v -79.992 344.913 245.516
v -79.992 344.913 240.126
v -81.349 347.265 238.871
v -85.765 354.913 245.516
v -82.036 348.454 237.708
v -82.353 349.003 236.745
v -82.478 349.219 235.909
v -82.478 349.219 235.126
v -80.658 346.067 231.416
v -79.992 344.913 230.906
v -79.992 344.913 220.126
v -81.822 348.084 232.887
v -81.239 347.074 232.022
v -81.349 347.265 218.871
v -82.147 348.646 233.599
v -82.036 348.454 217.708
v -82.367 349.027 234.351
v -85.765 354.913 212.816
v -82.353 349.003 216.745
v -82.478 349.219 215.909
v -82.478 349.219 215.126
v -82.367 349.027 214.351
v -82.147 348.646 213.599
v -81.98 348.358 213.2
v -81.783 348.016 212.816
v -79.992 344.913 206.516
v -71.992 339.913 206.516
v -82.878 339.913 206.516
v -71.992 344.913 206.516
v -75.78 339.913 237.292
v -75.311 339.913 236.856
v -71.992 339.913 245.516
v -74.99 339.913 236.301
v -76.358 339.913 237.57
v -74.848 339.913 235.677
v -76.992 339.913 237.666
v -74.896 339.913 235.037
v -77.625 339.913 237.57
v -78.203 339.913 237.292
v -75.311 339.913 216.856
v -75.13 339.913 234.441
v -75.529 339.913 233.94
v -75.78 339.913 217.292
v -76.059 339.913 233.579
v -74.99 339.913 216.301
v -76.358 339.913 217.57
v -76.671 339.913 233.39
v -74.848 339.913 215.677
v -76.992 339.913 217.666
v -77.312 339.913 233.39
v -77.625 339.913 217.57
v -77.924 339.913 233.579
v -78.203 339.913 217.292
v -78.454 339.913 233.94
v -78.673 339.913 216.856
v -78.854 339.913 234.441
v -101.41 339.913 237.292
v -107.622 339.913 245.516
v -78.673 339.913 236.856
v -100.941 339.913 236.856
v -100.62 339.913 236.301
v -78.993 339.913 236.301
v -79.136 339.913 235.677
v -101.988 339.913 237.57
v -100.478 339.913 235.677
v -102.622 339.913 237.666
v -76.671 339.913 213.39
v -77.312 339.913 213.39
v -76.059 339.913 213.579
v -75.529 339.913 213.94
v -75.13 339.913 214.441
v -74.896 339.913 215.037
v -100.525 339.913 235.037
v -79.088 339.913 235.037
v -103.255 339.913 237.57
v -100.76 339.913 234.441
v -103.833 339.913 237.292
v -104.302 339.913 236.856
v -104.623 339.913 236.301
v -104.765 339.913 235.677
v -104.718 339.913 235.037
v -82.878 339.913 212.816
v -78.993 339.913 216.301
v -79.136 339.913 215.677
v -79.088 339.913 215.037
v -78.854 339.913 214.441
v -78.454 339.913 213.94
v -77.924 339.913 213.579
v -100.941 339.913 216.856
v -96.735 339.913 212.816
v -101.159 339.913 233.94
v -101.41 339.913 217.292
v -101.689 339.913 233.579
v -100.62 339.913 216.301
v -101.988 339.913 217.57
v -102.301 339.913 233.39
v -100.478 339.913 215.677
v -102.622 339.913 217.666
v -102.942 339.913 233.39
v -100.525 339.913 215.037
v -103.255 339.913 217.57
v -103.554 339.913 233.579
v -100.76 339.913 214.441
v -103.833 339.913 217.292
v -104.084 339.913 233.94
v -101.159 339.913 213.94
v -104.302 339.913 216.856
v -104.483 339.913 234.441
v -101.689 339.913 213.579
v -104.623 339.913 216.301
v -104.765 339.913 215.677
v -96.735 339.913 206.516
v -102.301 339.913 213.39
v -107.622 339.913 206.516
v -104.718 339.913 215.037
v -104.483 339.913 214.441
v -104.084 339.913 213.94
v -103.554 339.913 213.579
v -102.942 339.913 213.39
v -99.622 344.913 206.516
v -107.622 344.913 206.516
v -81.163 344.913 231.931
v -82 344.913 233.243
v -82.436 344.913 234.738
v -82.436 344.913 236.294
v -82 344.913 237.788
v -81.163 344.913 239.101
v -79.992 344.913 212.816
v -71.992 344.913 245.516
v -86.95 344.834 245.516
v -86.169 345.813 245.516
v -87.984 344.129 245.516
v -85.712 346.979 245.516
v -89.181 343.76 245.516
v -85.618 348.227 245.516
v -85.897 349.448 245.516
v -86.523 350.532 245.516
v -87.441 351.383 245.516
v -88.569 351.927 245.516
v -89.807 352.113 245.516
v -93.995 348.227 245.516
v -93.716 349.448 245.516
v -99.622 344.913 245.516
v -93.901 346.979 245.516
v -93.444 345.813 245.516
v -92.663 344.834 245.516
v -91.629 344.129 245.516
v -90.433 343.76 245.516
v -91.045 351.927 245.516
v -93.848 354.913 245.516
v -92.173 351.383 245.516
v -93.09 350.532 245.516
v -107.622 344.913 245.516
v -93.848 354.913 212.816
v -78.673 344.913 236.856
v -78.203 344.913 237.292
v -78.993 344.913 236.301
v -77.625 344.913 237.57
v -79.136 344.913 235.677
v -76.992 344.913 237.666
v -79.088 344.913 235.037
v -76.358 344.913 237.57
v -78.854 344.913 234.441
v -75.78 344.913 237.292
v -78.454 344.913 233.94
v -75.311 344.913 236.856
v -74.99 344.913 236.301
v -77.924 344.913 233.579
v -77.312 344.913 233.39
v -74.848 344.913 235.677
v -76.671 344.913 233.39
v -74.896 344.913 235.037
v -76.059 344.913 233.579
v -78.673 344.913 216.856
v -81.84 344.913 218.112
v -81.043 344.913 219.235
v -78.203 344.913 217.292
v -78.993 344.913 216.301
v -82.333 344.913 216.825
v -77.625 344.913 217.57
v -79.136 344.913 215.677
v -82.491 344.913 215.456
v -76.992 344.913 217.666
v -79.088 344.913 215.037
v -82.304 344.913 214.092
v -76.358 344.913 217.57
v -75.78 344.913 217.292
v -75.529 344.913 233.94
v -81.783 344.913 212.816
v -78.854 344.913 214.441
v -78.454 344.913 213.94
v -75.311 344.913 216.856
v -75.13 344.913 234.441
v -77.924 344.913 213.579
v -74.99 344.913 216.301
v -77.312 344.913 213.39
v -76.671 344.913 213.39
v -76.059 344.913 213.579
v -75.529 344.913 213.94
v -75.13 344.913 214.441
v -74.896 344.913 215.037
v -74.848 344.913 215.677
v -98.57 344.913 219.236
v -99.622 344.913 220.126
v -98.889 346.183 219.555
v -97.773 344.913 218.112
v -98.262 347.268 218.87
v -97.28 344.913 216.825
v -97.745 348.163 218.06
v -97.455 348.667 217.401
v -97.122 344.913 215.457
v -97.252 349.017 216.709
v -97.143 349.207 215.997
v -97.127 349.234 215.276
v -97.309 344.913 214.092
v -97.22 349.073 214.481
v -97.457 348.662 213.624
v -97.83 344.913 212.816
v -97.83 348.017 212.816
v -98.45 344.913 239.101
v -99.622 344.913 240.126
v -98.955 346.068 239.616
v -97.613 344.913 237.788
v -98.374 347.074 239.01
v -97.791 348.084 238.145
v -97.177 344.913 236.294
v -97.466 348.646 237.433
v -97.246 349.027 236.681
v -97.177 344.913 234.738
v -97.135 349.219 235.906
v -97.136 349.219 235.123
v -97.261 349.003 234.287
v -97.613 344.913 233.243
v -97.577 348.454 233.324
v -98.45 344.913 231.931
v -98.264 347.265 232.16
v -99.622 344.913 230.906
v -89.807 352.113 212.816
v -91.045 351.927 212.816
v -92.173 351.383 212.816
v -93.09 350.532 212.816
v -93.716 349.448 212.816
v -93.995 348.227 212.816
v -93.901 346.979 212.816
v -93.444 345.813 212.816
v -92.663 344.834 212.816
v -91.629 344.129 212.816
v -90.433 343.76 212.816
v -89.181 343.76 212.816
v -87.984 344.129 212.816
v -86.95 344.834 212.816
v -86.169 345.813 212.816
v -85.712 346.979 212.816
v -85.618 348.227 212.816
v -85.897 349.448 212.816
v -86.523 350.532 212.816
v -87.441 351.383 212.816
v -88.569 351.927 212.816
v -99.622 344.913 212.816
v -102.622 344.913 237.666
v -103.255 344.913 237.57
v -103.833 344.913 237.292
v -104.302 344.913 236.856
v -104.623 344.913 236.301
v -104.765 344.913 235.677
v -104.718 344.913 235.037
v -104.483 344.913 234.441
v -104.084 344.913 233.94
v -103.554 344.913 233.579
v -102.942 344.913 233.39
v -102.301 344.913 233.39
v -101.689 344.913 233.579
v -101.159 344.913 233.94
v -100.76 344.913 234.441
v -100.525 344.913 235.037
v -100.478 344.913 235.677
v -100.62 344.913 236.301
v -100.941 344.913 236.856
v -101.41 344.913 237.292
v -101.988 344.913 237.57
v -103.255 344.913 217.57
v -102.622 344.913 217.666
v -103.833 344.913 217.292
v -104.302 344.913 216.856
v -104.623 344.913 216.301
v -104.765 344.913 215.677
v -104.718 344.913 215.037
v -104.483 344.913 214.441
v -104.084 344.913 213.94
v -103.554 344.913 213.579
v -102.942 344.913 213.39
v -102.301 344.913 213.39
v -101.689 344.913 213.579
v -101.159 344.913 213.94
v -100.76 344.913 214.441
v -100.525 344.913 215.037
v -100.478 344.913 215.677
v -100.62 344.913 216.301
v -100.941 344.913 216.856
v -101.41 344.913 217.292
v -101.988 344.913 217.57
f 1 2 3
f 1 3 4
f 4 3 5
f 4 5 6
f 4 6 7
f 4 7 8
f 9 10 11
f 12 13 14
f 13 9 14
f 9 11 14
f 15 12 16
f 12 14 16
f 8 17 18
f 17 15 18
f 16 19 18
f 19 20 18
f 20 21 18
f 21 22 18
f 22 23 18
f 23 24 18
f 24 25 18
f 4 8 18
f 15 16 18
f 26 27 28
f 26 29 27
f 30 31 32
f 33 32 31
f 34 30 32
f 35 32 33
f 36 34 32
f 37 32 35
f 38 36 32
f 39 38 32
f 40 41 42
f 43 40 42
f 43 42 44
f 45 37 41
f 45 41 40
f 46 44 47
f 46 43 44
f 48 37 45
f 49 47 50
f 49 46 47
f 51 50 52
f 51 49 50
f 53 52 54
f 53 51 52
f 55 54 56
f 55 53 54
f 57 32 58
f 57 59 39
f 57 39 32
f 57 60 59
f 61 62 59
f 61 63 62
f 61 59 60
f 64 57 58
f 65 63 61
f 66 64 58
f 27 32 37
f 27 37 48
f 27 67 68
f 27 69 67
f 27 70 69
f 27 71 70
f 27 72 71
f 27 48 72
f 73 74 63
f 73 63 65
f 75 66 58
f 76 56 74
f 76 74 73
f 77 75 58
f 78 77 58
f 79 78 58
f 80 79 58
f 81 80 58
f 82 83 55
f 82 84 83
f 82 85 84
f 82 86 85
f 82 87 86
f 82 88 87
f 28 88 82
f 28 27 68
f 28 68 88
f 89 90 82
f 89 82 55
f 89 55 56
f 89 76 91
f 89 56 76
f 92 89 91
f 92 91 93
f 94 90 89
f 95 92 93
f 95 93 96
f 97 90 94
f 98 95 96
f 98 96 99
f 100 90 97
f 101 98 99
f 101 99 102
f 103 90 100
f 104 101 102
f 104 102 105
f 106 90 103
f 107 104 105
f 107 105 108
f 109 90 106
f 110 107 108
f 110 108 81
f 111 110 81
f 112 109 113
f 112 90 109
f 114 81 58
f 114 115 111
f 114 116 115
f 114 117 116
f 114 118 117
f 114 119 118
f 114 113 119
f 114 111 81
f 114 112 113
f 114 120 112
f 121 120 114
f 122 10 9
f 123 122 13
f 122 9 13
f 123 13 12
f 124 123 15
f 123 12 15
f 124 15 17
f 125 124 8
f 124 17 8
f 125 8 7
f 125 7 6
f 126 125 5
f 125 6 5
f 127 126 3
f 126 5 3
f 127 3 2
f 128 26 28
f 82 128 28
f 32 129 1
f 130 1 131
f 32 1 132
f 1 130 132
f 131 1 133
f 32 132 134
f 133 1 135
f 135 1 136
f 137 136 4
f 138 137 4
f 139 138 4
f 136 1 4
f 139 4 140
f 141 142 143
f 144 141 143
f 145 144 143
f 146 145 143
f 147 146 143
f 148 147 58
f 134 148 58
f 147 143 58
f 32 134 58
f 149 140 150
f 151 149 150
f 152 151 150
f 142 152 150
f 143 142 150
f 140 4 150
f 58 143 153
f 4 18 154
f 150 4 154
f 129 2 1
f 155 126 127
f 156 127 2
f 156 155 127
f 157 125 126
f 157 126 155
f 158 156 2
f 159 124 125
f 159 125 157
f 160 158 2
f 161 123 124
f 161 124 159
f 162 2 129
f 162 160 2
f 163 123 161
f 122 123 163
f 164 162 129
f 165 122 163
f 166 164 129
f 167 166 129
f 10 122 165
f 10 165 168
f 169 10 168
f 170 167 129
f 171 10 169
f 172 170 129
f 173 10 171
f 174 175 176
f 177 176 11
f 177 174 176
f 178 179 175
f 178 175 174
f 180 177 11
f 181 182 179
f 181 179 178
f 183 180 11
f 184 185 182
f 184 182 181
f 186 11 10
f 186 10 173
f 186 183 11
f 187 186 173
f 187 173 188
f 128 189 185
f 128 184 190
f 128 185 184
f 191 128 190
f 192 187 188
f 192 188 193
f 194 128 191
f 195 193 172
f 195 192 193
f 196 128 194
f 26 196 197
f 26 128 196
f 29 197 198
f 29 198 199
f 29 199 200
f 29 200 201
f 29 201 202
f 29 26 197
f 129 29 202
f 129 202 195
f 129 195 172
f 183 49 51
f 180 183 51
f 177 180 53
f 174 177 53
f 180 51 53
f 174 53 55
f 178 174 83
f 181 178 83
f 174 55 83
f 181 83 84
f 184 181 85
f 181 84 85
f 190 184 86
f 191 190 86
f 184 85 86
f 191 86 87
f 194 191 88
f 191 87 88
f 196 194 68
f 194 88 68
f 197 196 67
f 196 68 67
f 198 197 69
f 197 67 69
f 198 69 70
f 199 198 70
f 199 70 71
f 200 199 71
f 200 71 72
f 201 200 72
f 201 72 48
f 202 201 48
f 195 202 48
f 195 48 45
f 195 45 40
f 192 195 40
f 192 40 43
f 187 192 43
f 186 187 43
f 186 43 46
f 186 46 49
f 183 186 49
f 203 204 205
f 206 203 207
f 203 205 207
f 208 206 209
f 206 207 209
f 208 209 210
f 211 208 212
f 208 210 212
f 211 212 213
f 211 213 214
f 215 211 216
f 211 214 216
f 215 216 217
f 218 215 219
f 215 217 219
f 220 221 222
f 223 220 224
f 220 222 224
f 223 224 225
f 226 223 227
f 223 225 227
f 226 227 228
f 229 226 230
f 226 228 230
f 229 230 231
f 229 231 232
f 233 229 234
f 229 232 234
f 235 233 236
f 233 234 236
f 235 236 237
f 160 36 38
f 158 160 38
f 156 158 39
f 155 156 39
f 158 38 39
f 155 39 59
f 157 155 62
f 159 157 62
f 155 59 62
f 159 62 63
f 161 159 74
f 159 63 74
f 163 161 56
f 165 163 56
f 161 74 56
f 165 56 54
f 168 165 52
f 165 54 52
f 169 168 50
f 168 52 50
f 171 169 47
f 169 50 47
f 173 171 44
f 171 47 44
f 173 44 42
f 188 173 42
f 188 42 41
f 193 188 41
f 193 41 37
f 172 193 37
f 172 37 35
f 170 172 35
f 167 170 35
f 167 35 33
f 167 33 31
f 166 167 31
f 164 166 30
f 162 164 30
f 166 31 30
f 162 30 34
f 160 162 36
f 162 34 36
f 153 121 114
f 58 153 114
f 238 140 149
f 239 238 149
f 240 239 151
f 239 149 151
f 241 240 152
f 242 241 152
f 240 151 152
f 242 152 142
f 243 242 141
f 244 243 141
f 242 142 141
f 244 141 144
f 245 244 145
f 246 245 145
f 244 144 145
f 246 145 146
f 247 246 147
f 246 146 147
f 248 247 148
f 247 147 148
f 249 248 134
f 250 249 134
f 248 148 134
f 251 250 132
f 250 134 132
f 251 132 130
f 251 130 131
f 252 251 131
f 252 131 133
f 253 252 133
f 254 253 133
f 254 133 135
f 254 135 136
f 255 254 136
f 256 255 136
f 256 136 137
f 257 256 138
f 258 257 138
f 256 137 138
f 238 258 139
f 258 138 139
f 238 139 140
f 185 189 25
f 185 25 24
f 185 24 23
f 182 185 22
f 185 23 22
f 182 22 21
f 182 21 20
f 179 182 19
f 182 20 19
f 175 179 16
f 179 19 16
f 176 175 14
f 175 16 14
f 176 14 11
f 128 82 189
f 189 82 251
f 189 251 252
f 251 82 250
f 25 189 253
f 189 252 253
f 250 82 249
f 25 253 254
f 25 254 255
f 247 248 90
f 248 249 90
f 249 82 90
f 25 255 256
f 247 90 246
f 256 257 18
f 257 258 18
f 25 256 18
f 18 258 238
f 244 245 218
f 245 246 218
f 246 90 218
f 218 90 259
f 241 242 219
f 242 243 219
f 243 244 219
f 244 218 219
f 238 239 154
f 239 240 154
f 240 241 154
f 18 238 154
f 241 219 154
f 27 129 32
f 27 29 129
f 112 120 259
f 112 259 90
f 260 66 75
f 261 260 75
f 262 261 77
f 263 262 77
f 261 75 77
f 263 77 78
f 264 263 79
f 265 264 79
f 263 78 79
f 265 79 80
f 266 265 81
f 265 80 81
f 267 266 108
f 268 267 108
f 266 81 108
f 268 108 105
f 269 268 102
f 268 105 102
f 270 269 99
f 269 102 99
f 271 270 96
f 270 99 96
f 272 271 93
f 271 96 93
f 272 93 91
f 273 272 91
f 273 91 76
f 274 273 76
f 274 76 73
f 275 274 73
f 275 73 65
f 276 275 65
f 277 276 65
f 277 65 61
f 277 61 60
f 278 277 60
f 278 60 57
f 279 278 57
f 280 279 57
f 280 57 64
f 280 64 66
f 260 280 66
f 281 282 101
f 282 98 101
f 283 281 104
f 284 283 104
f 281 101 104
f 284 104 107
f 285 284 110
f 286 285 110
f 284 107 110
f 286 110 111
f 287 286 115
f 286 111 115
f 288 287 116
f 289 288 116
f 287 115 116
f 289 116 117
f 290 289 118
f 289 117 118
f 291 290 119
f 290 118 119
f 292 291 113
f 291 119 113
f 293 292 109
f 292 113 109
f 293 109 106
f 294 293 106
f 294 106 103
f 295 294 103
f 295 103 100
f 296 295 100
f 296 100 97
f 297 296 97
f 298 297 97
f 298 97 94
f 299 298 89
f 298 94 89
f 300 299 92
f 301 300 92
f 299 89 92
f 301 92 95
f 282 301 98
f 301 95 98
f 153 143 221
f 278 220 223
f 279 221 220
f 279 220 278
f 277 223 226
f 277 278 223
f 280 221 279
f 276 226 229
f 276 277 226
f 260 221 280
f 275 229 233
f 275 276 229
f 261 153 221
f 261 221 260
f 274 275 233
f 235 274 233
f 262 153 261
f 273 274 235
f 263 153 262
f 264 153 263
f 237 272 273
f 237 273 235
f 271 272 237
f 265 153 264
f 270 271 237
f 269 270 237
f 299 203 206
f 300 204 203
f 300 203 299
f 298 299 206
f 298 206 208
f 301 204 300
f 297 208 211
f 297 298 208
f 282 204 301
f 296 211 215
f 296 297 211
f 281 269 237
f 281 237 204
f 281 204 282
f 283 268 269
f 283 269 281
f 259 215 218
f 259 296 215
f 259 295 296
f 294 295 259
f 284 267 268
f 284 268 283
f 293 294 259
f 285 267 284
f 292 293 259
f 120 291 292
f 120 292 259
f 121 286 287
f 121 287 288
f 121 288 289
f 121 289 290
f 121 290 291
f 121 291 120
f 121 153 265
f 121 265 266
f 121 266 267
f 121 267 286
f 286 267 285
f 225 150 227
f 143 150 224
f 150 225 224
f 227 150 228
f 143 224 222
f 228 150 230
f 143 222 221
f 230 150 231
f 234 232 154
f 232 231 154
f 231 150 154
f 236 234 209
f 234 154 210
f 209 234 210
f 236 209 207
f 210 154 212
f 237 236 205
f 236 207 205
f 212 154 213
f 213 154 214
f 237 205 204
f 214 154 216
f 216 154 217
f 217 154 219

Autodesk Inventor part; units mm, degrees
ref_plane "YZ Plane" through (0, 0, 0) normal (1, 0, 0) x (0, 1, 0)
ref_plane "XZ Plane" through (0, 0, 0) normal (0, 1, 0) x (-1, 0, 0)
ref_plane "Work Plane2" through (234.4934, -62.0868, 206.5159) normal (0, 0, -1) x (-1, 0, 0)
sketch "Sketch3" plane through (234.4934, -62.0868, 206.5159) normal (0, 0, -1) x (-1, 0, 0)
  circle A0 centre (324.3, 410) radius 4 construction
  line L0 (314.485, 407) -> (320.2585, 417)
  line L1 (320.2585, 417) -> (328.3415, 417)
  line L2 (328.3415, 417) -> (334.115, 407)
  line L3 (-385, 402) -> (385, 402) construction
  line L4 (314.485, 407) -> (314.485, 402) construction
  line L5 (334.115, 407) -> (334.115, 402) construction
  line L6 (314.485, 407) -> (306.485, 407)
  line L7 (306.485, 407) -> (306.485, 402)
  line L8 (306.485, 402) -> (314.485, 402)
  line L9 (314.485, 402) -> (314.485, 407) construction
  line L10 (334.115, 407) -> (342.115, 407)
  line L11 (342.115, 407) -> (342.115, 402)
  line L12 (342.115, 402) -> (334.115, 402)
  line L13 (334.115, 402) -> (334.115, 407) construction
  line L14 (314.485, 402) -> (334.115, 402)
  point P0 (234.4934, 62.0868)
  dimension "d19" = 8
  dimension "d20" = 3
  dimension "d21" = 60
  dimension "d22" = 60
  dimension "d24" = 3
  dimension "d25" = 3
  dimension "d26" = 5
  dimension "d27" = 5
  dimension "d28" = 8
  dimension "d29" = 8
ref_plane "Work Plane3" through (-75.5066, 299.1132, 245.5159) normal (0, 0, 1) x (1, 0, 0)
extrude "Extrusion2" add sketch "Sketch3" against normal up to surface (39 mm away)
sketch "Sketch4" plane through (234.4934, -62.0868, 206.5159) normal (0, 0, -1) x (-1, 0, 0)
  point P0 (234.4934, 62.0868)
  point P1 (324.3, 410)
hole "Hole2" at (-89.8066, 347.9132, 206.5159) direction (0, 0, 1) diameter 8.4 end through all counterbore diameter 18 counterbore depth 6.3 clearance for "Hex Head Cap Screw DIN EN 24017" size "M8" standard "DIN"
sketch "Sketch5" plane through (-79.9916, 344.9132, 206.5159) normal (0, 1, 0) x (1, 0, 0)
  line L0 (-119.515, -29) -> (748.485, -29) construction
  line L1 (-119.515, -9) -> (748.485, -9) construction
  line L2 (8, 0) -> (8, -39) construction
  line L3 (-27.6299, 0) -> (-27.6299, -39) construction
  point P0 (79.9916, 206.5159)
  point P1 (3, -29)
  point P2 (-22.6299, -29)
  point P3 (-22.6299, -9)
  point P4 (3, -9)
  dimension "d39" = 5
  dimension "d40" = 5
  dimension "d41" = 5
  dimension "d42" = 5
hole "Hole3" at (-76.9916, 344.9132, 235.5159) at (-102.6215, 344.9132, 235.5159) at (-102.6215, 344.9132, 215.5159) at (-76.9916, 344.9132, 215.5159) direction (0, -1, 0) diameter 4.3 end through all clearance for "Hex Head Cap Screw DIN EN 24017" size "M4" standard "DIN"
sketch "Sketch6" plane through (-79.9916, 344.9132, 206.5159) normal (0, 1, 0) x (1, 0, 0)
  point P0 (79.9916, 206.5159)
  point P1 (3, -29)
  point P2 (-22.6299, -29)
  point P3 (-22.6299, -9)
  point P4 (3, -9)
hole "Hole4" at (-76.9916, 344.9132, 235.5159) at (-102.6215, 344.9132, 235.5159) at (-102.6215, 344.9132, 215.5159) at (-76.9916, 344.9132, 215.5159) direction (0, 1, 0) diameter 11 end through all
sketch "Sketch7" plane through (234.4934, -62.0868, 206.5159) normal (0, 0, -1) x (-1, 0, 0)
  arc A0 (315.4094, 408.601) -> (320.1769, 402) centre (324.3, 410) ccw projected
  line L0 (315.4094, 408.601) -> (314.485, 407) projected
  line L1 (314.485, 407) -> (306.485, 407) projected
  line L2 (306.485, 407) -> (306.485, 402) projected
  line L3 (306.485, 402) -> (320.1769, 402) projected
  arc A1 (328.4231, 402) -> (333.1906, 408.601) centre (324.3, 410) ccw projected
  line L4 (328.4231, 402) -> (342.115, 402) projected
  line L5 (342.115, 402) -> (342.115, 407) projected
  line L6 (342.115, 407) -> (334.115, 407) projected
  line L7 (334.115, 407) -> (333.1906, 408.601) projected
  line L8 (320.2585, 417) -> (314.485, 407) projected
  line L9 (314.485, 407) -> (317.3718, 402)
  line L10 (306.485, 402) -> (342.115, 402) projected
  line L11 (342.115, 407) -> (334.115, 407) projected
  line L12 (334.115, 407) -> (331.2282, 402)
  point P0 (234.4934, 62.0868)
  point P1 (308.4231, 367)
  dimension "d63" = 60
  dimension "d64" = 60
extrude "Extrusion3" cut sketch "Sketch7" against normal up to surface (6.3 mm away) contours A0 L3 L9 L0 | A1 L7 L12 L4
equation "\"d22\" = d21"
equation "\"d24\" = d20"
equation "\"d25\" = d24"
equation "\"d27\" = d26"
equation "\"d29\" = d28"
equation "\"d40\" = d39"
equation "\"d41\" = d39"
equation "\"d42\" = d39"
properties part number "AxleHolder"
